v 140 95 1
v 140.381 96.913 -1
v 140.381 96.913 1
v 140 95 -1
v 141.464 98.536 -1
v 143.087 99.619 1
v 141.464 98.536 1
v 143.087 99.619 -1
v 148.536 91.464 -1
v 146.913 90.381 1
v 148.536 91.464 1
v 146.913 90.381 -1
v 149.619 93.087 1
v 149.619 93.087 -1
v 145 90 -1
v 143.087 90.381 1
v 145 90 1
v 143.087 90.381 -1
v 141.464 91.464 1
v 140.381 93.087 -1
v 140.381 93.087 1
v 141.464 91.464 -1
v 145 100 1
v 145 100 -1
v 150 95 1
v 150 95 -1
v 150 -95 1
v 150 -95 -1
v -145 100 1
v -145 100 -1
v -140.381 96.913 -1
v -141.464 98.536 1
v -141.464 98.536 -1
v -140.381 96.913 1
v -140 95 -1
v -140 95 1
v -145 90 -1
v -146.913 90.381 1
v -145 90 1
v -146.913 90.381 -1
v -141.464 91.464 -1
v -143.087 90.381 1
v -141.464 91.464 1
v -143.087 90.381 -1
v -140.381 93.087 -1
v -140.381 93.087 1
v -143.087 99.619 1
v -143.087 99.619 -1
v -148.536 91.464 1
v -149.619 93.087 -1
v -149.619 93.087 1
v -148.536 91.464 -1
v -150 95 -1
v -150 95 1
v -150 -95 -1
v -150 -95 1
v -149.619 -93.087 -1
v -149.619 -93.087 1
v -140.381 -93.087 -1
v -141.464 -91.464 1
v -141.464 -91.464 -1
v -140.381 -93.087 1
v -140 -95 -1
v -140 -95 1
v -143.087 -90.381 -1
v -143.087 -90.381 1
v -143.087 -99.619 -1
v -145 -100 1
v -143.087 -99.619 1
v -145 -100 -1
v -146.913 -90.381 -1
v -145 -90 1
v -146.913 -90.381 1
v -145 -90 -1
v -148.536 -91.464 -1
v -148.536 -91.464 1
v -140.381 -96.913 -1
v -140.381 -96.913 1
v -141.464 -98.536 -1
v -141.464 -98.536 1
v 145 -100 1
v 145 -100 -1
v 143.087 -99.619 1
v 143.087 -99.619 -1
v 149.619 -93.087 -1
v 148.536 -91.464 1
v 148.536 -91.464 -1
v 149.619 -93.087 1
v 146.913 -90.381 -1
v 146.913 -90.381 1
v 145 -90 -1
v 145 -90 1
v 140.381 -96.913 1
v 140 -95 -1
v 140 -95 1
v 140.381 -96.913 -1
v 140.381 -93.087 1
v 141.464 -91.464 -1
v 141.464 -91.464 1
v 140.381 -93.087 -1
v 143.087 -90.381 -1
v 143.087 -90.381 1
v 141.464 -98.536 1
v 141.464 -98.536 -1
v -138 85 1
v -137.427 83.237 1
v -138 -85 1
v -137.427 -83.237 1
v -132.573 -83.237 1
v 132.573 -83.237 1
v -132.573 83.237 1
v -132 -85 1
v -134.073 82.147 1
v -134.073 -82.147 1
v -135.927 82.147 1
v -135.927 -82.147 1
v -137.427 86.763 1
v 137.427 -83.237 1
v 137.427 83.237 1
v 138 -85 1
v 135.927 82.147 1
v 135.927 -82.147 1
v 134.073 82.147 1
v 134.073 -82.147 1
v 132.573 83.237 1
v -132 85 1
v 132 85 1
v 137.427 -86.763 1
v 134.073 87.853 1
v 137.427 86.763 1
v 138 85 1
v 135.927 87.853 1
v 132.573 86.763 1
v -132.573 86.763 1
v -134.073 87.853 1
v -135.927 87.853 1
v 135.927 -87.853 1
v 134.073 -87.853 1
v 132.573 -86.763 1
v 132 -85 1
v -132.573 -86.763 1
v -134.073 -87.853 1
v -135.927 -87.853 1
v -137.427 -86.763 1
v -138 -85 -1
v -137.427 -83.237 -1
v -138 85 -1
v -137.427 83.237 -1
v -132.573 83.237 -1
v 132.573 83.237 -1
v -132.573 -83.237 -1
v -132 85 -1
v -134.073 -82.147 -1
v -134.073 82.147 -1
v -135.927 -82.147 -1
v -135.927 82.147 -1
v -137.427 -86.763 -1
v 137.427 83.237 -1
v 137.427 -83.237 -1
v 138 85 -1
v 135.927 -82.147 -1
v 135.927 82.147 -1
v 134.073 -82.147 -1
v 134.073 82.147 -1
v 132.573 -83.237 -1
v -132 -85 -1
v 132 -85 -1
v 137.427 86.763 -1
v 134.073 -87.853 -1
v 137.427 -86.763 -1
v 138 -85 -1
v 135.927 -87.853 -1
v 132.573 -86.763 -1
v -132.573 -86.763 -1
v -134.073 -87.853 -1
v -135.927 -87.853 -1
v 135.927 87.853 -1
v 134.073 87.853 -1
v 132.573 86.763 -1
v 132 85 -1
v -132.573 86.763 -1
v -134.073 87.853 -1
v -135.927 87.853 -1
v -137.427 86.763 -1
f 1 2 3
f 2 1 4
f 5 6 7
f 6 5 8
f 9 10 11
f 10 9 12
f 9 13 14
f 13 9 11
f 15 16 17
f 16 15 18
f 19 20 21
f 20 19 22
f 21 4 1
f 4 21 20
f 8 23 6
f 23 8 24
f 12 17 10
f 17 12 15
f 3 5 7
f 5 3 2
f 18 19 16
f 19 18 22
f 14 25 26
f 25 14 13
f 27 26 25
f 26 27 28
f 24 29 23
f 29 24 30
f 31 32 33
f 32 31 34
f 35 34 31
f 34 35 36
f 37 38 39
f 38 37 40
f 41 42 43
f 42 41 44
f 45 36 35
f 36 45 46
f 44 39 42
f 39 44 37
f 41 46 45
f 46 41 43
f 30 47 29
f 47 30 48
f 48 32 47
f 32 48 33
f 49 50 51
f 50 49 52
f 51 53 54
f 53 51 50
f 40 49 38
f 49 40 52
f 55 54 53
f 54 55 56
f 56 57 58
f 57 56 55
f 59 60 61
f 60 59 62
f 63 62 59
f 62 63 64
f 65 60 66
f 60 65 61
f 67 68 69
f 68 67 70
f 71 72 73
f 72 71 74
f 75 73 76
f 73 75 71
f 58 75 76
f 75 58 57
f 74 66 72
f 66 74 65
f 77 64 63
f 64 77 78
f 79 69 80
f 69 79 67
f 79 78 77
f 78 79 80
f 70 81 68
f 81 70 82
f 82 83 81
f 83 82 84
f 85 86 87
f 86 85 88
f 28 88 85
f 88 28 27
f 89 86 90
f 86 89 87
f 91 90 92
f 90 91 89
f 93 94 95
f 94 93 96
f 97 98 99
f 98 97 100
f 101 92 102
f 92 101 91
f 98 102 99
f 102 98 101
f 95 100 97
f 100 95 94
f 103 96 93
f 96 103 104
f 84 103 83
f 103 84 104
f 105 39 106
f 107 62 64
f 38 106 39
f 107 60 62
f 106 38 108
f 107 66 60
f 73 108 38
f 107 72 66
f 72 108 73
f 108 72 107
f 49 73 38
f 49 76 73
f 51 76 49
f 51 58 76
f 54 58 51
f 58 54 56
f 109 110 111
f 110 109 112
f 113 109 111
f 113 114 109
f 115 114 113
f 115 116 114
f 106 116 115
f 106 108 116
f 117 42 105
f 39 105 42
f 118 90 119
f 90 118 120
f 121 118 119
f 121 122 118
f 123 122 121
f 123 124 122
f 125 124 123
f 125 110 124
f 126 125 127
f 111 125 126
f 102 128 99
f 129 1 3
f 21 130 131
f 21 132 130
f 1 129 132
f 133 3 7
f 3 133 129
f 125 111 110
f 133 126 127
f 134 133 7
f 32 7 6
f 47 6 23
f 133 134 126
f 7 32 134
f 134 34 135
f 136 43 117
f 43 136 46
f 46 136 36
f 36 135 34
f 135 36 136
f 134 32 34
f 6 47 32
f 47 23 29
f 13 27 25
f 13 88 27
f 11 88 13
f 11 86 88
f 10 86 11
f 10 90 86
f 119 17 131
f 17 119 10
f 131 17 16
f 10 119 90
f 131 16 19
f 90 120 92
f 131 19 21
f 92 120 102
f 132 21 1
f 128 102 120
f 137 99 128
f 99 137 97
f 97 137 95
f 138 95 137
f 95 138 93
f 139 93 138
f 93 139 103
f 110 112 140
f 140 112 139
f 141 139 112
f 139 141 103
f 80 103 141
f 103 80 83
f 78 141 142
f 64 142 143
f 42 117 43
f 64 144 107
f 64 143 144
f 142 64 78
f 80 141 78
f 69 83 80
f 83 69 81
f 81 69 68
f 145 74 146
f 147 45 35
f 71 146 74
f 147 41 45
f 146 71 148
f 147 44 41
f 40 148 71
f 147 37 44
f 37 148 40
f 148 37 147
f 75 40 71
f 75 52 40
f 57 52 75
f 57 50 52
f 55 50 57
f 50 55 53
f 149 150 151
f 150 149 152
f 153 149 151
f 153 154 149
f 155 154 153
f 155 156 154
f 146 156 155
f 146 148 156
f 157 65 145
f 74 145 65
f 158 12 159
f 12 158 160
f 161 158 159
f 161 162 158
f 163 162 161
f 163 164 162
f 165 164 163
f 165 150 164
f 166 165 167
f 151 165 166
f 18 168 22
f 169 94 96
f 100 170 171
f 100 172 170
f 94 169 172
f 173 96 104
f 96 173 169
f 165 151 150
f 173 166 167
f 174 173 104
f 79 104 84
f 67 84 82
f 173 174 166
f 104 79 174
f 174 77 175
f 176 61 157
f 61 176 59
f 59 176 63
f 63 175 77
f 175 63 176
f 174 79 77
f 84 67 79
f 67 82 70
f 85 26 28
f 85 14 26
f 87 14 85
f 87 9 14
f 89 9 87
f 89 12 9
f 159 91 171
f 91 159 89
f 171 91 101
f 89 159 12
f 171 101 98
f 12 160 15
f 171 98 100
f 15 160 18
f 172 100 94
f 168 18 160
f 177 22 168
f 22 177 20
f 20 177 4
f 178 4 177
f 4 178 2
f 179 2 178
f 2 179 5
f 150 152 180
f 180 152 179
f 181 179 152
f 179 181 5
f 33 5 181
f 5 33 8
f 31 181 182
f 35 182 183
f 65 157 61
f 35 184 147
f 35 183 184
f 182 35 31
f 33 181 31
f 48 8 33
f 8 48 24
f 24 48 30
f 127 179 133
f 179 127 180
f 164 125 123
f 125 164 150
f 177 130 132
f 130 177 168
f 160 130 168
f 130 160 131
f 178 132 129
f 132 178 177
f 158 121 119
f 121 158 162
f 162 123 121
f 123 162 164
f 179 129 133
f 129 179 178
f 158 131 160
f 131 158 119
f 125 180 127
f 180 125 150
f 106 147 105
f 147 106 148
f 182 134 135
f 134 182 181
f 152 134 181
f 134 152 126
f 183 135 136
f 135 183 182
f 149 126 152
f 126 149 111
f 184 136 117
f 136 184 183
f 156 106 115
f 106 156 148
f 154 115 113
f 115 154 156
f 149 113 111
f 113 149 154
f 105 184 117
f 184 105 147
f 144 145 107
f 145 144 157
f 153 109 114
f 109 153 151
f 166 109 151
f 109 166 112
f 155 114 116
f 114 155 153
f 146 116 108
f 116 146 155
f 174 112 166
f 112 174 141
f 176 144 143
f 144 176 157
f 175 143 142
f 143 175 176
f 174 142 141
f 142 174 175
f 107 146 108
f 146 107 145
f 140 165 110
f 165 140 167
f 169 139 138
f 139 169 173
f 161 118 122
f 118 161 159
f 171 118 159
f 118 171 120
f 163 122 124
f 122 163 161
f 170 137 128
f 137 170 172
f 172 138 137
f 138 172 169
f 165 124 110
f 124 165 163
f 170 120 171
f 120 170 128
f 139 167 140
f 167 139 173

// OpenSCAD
// Parameters
sheet_length = 300; //[150:600:1]
sheet_width = 200; //[100:400:1]
sheet_thickness = 2; //[1:6:0.5]
corner_radius = 5; //[2:20:1]
mount_hole_diameter = 6; //[3:12:0.5]
mount_hole_edge_offset = 15; //[8:40:1]
hole_clearance_z = 2; //[1:10:1]

// Base shapes
module sheet_plate() {
  cube([sheet_length, sheet_width, sheet_thickness], center=true);
}

module corner_cut_cylinder(x, y) {
  translate([x, y, 0])
    cylinder(r=corner_radius, h=sheet_thickness + hole_clearance_z, center=true);
}

module corner_cut_box(x, y) {
  translate([x, y, 0])
    cube([corner_radius, corner_radius, sheet_thickness + hole_clearance_z], center=true);
}

module mounting_hole(x, y) {
  translate([x, y, 0])
    cylinder(r=mount_hole_diameter/2, h=sheet_thickness + hole_clearance_z, center=true);
}

// Operations
module corner_cut_union() {
  union() {
    corner_cut_cylinder(sheet_length/2 - corner_radius, sheet_width/2 - corner_radius);
    corner_cut_box(sheet_length/2 - corner_radius/2, sheet_width/2 - corner_radius/2);
    corner_cut_cylinder(-sheet_length/2 + corner_radius, sheet_width/2 - corner_radius);
    corner_cut_box(-sheet_length/2 + corner_radius/2, sheet_width/2 - corner_radius/2);
    corner_cut_cylinder(-sheet_length/2 + corner_radius, -sheet_width/2 + corner_radius);
    corner_cut_box(-sheet_length/2 + corner_radius/2, -sheet_width/2 + corner_radius/2);
    corner_cut_cylinder(sheet_length/2 - corner_radius, -sheet_width/2 + corner_radius);
    corner_cut_box(sheet_length/2 - corner_radius/2, -sheet_width/2 + corner_radius/2);
  }
}

module rounded_sheet() {
  difference() {
    sheet_plate();
    corner_cut_union();
  }
}

module mount_holes_union() {
  union() {
    mounting_hole(sheet_length/2 - mount_hole_edge_offset, sheet_width/2 - mount_hole_edge_offset);
    mounting_hole(-sheet_length/2 + mount_hole_edge_offset, sheet_width/2 - mount_hole_edge_offset);
    mounting_hole(-sheet_length/2 + mount_hole_edge_offset, -sheet_width/2 + mount_hole_edge_offset);
    mounting_hole(sheet_length/2 - mount_hole_edge_offset, -sheet_width/2 + mount_hole_edge_offset);
  }
}

module final_sheet() {
  difference() {
    rounded_sheet();
    mount_holes_union();
  }
}

// Final output
color([0.0, 0.4, 0.2]) // Carbon-fiber sheet color
final_sheet();
